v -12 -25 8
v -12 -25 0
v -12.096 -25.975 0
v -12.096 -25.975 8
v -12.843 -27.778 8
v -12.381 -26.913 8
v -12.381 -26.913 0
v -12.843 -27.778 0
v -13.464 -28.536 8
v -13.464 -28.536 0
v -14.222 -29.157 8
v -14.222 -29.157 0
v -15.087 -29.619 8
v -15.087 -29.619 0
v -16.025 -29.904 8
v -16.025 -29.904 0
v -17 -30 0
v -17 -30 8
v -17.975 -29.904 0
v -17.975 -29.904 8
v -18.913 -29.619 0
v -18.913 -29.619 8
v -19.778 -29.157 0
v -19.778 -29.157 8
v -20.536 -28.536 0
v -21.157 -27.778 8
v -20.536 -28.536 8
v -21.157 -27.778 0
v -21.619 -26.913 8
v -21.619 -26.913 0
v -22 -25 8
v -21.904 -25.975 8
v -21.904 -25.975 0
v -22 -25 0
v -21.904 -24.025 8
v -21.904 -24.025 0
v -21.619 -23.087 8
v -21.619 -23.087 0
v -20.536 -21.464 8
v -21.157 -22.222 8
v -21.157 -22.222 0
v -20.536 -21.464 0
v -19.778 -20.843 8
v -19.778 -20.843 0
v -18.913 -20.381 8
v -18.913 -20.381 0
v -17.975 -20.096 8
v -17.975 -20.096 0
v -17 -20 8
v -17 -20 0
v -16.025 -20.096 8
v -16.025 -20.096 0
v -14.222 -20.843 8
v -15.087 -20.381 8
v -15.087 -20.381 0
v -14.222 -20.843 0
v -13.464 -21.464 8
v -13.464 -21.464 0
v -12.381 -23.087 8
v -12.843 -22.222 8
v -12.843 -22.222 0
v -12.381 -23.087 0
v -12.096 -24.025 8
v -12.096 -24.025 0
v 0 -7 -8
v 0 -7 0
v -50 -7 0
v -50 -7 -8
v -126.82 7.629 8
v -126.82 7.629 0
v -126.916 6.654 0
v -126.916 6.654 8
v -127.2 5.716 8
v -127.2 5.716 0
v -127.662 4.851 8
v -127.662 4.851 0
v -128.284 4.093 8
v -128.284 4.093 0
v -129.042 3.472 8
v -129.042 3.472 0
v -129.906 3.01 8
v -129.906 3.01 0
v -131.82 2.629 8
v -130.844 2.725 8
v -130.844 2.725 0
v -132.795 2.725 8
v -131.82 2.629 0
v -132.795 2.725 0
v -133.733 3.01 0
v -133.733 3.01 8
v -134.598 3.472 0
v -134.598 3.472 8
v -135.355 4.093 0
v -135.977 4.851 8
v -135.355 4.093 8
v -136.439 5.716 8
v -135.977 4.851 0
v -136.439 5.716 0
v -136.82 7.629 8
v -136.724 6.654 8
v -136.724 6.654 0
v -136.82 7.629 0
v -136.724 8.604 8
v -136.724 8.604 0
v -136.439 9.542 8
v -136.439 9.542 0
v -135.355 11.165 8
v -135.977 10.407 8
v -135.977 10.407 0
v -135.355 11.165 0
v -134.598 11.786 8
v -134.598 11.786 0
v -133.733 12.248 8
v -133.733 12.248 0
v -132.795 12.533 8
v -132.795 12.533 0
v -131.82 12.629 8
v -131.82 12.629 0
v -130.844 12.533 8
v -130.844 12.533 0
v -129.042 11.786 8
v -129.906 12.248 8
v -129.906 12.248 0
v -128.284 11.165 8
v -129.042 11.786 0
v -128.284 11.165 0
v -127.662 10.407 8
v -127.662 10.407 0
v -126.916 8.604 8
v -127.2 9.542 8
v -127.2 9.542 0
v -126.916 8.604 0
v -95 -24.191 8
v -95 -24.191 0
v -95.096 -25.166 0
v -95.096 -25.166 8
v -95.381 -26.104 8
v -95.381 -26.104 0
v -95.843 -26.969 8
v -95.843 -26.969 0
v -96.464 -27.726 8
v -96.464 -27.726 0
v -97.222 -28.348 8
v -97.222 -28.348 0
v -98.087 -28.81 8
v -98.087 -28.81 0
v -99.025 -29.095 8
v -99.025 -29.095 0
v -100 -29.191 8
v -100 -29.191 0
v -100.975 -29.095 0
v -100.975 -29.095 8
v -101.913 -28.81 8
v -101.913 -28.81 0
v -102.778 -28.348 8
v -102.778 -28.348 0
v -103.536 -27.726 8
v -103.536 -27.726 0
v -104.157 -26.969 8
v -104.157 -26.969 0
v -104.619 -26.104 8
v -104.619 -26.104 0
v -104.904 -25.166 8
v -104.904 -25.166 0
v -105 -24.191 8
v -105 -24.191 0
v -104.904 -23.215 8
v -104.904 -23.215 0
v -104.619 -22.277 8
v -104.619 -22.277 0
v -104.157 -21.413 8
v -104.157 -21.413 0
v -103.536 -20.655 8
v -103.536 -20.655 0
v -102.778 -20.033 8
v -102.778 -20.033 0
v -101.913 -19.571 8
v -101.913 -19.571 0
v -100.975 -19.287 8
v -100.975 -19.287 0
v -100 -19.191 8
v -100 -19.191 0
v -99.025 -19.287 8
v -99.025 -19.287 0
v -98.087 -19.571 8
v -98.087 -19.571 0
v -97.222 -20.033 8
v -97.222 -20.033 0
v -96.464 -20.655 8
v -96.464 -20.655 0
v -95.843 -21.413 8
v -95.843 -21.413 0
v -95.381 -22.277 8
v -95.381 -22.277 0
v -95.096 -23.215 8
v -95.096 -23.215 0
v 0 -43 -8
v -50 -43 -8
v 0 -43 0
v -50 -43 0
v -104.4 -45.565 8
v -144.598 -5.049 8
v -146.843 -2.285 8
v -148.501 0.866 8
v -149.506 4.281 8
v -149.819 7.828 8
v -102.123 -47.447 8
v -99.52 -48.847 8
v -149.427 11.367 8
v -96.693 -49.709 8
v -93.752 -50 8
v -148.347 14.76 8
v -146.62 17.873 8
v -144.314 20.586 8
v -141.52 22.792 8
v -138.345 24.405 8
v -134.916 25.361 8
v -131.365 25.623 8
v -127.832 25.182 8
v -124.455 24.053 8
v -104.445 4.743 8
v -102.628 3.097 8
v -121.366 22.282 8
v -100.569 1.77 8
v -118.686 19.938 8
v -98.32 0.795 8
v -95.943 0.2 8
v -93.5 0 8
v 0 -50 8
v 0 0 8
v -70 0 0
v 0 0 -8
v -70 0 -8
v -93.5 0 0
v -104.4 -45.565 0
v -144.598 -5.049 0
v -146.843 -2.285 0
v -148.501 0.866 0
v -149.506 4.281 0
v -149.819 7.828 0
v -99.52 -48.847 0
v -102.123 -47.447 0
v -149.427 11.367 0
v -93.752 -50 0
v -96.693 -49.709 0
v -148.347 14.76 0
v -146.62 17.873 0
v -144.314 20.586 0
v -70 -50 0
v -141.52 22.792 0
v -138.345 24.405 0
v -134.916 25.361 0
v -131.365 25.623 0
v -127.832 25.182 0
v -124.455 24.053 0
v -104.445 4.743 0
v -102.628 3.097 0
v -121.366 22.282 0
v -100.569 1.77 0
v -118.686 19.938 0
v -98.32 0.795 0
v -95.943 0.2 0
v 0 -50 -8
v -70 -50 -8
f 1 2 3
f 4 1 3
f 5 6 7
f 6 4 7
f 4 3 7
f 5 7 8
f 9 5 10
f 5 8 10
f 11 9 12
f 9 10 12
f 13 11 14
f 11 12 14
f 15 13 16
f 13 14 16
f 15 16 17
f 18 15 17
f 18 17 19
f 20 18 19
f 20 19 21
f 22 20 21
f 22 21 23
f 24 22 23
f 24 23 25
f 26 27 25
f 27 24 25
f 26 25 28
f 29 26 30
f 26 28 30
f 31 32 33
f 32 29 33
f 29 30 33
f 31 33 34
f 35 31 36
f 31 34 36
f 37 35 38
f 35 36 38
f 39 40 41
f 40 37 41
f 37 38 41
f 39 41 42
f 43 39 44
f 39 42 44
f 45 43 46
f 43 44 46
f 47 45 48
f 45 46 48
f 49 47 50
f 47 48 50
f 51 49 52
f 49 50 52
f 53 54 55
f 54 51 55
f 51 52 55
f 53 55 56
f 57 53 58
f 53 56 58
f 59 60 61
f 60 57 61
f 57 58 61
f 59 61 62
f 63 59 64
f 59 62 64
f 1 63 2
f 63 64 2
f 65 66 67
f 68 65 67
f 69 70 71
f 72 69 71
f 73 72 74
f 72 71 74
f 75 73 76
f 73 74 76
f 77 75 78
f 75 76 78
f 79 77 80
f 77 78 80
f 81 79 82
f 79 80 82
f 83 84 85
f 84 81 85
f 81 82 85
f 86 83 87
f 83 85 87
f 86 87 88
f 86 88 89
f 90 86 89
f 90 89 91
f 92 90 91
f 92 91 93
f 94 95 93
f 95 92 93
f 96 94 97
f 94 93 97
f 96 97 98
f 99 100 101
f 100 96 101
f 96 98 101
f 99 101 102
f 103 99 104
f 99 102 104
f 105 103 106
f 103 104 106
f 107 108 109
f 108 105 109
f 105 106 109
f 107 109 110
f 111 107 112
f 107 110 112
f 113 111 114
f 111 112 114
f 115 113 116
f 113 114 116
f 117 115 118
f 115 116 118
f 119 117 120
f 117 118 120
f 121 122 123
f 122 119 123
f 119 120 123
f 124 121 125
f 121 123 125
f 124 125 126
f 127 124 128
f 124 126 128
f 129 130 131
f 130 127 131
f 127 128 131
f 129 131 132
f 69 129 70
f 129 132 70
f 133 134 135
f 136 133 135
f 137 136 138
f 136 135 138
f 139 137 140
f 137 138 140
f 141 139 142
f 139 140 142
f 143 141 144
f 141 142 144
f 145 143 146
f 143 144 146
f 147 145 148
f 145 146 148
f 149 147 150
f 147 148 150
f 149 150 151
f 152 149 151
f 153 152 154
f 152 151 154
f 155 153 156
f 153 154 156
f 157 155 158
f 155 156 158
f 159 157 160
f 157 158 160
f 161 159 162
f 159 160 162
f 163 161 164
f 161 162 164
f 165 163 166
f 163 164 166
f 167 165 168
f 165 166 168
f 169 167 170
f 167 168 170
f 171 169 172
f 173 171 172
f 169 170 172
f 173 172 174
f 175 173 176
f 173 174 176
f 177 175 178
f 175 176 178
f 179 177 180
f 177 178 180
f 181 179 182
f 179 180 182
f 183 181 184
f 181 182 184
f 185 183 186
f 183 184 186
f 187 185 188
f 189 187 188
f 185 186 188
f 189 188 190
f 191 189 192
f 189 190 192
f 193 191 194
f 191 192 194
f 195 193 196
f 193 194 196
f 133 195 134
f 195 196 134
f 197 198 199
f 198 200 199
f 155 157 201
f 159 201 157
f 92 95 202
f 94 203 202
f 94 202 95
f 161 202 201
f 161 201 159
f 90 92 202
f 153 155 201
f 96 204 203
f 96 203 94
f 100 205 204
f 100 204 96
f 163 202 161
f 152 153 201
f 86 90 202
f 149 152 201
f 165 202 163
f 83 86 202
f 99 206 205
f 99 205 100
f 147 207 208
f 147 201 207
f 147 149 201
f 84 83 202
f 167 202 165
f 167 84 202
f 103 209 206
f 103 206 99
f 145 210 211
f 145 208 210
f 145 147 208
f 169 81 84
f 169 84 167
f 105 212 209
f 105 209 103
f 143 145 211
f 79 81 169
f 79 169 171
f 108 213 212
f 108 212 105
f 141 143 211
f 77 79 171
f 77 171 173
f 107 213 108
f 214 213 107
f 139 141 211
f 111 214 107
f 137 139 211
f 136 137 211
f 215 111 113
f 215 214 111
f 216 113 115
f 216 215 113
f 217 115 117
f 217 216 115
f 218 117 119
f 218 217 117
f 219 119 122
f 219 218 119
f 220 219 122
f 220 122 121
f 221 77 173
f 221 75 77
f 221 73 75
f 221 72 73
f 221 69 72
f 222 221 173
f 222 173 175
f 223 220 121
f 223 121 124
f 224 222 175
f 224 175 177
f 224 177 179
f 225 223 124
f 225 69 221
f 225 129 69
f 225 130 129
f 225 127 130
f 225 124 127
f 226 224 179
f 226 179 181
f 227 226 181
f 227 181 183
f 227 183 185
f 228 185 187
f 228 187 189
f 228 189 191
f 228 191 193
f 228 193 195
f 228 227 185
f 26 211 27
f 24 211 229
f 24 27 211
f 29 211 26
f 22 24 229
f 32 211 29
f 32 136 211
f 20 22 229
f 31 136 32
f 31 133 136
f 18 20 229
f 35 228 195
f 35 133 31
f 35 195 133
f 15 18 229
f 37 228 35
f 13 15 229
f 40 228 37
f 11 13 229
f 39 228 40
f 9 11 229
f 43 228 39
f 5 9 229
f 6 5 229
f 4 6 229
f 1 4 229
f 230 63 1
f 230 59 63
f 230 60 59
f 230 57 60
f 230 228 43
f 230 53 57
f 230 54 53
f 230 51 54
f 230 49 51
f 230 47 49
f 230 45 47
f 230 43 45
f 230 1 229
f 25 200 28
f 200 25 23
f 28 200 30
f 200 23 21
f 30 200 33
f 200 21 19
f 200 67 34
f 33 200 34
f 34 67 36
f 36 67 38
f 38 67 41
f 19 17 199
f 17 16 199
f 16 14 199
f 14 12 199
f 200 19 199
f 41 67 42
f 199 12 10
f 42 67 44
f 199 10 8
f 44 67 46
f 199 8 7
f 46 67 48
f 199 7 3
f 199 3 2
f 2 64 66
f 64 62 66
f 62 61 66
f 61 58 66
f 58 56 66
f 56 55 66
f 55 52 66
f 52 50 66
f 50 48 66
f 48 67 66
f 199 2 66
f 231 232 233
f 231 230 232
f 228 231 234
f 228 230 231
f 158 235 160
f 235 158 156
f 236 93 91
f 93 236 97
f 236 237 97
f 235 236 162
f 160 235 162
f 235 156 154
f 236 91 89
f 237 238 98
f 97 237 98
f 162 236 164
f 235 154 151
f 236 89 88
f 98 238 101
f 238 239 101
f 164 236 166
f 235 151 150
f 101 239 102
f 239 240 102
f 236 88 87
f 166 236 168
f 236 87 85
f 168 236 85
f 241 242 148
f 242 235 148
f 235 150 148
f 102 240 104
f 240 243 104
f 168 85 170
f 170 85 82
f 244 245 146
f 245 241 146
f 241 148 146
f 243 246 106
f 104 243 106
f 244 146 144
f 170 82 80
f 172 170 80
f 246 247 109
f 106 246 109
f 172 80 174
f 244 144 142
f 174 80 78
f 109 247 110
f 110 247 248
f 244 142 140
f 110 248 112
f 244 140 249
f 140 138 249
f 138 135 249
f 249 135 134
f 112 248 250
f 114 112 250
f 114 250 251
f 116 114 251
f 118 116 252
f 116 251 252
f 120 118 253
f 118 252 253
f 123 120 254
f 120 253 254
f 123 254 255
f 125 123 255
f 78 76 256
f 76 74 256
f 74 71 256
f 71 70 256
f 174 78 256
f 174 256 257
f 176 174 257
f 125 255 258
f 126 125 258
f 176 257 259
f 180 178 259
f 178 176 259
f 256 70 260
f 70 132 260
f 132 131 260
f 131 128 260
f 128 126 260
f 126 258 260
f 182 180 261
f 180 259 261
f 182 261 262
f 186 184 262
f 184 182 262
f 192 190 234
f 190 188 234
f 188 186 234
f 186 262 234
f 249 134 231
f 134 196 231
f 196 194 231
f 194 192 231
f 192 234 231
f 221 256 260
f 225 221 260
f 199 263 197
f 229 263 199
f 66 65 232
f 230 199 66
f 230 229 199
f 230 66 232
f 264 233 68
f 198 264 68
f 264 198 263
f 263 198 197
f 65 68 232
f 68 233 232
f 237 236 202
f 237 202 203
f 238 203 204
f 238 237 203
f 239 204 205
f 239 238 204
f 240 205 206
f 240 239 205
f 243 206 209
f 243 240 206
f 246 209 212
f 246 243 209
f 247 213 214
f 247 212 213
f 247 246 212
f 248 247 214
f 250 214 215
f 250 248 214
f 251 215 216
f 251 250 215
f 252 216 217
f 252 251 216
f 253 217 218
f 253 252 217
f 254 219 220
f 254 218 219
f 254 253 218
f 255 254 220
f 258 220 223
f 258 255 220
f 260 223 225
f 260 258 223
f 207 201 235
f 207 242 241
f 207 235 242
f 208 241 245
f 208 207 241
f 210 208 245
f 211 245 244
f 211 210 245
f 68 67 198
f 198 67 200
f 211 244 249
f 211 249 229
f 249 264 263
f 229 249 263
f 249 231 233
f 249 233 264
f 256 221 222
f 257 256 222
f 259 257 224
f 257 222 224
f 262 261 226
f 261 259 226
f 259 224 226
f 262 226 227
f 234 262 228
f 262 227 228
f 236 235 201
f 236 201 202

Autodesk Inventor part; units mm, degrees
ref_plane "YZ Plane" through (0, 0, 0) normal (1, 0, 0) x (0, 1, 0)
ref_plane "XZ Plane" through (0, 0, 0) normal (0, 1, 0) x (-1, 0, 0)
ref_plane "XY Plane" through (0, 0, 0) normal (0, 0, 1) x (1, 0, 0)
sketch "Sketch1" plane through (0, 0, 0) normal (0, 0, 1) x (1, 0, 0)
  line L0 (0, 0) -> (-100, 0)
  line L1 (-100, 0) -> (-100, -50)
  line L2 (-100, -50) -> (0, -50)
  line L3 (0, -50) -> (0, 0)
  line L4 (0, 0) -> (-70, 0)
  line L5 (-70, 0) -> (-70, -50)
  line L6 (-70, -50) -> (0, -50)
  line L7 (0, -50) -> (0, 0)
  line L8 (0, -7) -> (-50, -7)
  line L9 (-50, -7) -> (-50, -43)
  line L10 (-50, -43) -> (0, -43)
  line L11 (0, -43) -> (0, -7)
  line L12 (-100, -24.1908) -> (-131.8198, 7.629)
  line L13 (-100, -24.1908) -> (-55, -24.1908) construction
  circle A0 centre (-131.8198, 7.629) radius 5
  circle A1 centre (-100, -24.1908) radius 5
  circle A2 centre (-17, -25) radius 5
  circle A3 centre (-131.8198, 7.629) radius 18
  line L14 (-100, 0) -> (-118.6863, 19.938)
  line L15 (-100, -50) -> (-144.5979, -5.0486)
  point P0 (0, -43)
  dimension "d0" = 100
  dimension "d1" = 50
  dimension "d2" = 36
  dimension "d3" = 50
  dimension "d4" = 7
  dimension "d5" = 45
  dimension "d6" = 135
  dimension "d7" = 10
  dimension "d8" = 36
  dimension "d9" = 17
  dimension "d10" = 25
  dimension "d11" = 70
  dimension "d13" = 133.144
extrude "Extrusion1" add sketch "Sketch1" along normal blind 8 contours L3 L8 L9 L10 L2 L5 L0 | L5 L2 L1 A1 L0 | L3 L10 L9 L8 | L1 A1 L12 A3 L14 | A3 | L15 A3 L12 A1 L1
extrude "Extrusion2" add sketch "Sketch1" against normal blind 8 contours L3 L8 L9 L10 L2 L5 L0
fillet "Fillet1" radius 15 2 edges at (-100, 0, 4) (-100, -50, 4)
properties part number "handlesupport" material "Steel, Mild"
